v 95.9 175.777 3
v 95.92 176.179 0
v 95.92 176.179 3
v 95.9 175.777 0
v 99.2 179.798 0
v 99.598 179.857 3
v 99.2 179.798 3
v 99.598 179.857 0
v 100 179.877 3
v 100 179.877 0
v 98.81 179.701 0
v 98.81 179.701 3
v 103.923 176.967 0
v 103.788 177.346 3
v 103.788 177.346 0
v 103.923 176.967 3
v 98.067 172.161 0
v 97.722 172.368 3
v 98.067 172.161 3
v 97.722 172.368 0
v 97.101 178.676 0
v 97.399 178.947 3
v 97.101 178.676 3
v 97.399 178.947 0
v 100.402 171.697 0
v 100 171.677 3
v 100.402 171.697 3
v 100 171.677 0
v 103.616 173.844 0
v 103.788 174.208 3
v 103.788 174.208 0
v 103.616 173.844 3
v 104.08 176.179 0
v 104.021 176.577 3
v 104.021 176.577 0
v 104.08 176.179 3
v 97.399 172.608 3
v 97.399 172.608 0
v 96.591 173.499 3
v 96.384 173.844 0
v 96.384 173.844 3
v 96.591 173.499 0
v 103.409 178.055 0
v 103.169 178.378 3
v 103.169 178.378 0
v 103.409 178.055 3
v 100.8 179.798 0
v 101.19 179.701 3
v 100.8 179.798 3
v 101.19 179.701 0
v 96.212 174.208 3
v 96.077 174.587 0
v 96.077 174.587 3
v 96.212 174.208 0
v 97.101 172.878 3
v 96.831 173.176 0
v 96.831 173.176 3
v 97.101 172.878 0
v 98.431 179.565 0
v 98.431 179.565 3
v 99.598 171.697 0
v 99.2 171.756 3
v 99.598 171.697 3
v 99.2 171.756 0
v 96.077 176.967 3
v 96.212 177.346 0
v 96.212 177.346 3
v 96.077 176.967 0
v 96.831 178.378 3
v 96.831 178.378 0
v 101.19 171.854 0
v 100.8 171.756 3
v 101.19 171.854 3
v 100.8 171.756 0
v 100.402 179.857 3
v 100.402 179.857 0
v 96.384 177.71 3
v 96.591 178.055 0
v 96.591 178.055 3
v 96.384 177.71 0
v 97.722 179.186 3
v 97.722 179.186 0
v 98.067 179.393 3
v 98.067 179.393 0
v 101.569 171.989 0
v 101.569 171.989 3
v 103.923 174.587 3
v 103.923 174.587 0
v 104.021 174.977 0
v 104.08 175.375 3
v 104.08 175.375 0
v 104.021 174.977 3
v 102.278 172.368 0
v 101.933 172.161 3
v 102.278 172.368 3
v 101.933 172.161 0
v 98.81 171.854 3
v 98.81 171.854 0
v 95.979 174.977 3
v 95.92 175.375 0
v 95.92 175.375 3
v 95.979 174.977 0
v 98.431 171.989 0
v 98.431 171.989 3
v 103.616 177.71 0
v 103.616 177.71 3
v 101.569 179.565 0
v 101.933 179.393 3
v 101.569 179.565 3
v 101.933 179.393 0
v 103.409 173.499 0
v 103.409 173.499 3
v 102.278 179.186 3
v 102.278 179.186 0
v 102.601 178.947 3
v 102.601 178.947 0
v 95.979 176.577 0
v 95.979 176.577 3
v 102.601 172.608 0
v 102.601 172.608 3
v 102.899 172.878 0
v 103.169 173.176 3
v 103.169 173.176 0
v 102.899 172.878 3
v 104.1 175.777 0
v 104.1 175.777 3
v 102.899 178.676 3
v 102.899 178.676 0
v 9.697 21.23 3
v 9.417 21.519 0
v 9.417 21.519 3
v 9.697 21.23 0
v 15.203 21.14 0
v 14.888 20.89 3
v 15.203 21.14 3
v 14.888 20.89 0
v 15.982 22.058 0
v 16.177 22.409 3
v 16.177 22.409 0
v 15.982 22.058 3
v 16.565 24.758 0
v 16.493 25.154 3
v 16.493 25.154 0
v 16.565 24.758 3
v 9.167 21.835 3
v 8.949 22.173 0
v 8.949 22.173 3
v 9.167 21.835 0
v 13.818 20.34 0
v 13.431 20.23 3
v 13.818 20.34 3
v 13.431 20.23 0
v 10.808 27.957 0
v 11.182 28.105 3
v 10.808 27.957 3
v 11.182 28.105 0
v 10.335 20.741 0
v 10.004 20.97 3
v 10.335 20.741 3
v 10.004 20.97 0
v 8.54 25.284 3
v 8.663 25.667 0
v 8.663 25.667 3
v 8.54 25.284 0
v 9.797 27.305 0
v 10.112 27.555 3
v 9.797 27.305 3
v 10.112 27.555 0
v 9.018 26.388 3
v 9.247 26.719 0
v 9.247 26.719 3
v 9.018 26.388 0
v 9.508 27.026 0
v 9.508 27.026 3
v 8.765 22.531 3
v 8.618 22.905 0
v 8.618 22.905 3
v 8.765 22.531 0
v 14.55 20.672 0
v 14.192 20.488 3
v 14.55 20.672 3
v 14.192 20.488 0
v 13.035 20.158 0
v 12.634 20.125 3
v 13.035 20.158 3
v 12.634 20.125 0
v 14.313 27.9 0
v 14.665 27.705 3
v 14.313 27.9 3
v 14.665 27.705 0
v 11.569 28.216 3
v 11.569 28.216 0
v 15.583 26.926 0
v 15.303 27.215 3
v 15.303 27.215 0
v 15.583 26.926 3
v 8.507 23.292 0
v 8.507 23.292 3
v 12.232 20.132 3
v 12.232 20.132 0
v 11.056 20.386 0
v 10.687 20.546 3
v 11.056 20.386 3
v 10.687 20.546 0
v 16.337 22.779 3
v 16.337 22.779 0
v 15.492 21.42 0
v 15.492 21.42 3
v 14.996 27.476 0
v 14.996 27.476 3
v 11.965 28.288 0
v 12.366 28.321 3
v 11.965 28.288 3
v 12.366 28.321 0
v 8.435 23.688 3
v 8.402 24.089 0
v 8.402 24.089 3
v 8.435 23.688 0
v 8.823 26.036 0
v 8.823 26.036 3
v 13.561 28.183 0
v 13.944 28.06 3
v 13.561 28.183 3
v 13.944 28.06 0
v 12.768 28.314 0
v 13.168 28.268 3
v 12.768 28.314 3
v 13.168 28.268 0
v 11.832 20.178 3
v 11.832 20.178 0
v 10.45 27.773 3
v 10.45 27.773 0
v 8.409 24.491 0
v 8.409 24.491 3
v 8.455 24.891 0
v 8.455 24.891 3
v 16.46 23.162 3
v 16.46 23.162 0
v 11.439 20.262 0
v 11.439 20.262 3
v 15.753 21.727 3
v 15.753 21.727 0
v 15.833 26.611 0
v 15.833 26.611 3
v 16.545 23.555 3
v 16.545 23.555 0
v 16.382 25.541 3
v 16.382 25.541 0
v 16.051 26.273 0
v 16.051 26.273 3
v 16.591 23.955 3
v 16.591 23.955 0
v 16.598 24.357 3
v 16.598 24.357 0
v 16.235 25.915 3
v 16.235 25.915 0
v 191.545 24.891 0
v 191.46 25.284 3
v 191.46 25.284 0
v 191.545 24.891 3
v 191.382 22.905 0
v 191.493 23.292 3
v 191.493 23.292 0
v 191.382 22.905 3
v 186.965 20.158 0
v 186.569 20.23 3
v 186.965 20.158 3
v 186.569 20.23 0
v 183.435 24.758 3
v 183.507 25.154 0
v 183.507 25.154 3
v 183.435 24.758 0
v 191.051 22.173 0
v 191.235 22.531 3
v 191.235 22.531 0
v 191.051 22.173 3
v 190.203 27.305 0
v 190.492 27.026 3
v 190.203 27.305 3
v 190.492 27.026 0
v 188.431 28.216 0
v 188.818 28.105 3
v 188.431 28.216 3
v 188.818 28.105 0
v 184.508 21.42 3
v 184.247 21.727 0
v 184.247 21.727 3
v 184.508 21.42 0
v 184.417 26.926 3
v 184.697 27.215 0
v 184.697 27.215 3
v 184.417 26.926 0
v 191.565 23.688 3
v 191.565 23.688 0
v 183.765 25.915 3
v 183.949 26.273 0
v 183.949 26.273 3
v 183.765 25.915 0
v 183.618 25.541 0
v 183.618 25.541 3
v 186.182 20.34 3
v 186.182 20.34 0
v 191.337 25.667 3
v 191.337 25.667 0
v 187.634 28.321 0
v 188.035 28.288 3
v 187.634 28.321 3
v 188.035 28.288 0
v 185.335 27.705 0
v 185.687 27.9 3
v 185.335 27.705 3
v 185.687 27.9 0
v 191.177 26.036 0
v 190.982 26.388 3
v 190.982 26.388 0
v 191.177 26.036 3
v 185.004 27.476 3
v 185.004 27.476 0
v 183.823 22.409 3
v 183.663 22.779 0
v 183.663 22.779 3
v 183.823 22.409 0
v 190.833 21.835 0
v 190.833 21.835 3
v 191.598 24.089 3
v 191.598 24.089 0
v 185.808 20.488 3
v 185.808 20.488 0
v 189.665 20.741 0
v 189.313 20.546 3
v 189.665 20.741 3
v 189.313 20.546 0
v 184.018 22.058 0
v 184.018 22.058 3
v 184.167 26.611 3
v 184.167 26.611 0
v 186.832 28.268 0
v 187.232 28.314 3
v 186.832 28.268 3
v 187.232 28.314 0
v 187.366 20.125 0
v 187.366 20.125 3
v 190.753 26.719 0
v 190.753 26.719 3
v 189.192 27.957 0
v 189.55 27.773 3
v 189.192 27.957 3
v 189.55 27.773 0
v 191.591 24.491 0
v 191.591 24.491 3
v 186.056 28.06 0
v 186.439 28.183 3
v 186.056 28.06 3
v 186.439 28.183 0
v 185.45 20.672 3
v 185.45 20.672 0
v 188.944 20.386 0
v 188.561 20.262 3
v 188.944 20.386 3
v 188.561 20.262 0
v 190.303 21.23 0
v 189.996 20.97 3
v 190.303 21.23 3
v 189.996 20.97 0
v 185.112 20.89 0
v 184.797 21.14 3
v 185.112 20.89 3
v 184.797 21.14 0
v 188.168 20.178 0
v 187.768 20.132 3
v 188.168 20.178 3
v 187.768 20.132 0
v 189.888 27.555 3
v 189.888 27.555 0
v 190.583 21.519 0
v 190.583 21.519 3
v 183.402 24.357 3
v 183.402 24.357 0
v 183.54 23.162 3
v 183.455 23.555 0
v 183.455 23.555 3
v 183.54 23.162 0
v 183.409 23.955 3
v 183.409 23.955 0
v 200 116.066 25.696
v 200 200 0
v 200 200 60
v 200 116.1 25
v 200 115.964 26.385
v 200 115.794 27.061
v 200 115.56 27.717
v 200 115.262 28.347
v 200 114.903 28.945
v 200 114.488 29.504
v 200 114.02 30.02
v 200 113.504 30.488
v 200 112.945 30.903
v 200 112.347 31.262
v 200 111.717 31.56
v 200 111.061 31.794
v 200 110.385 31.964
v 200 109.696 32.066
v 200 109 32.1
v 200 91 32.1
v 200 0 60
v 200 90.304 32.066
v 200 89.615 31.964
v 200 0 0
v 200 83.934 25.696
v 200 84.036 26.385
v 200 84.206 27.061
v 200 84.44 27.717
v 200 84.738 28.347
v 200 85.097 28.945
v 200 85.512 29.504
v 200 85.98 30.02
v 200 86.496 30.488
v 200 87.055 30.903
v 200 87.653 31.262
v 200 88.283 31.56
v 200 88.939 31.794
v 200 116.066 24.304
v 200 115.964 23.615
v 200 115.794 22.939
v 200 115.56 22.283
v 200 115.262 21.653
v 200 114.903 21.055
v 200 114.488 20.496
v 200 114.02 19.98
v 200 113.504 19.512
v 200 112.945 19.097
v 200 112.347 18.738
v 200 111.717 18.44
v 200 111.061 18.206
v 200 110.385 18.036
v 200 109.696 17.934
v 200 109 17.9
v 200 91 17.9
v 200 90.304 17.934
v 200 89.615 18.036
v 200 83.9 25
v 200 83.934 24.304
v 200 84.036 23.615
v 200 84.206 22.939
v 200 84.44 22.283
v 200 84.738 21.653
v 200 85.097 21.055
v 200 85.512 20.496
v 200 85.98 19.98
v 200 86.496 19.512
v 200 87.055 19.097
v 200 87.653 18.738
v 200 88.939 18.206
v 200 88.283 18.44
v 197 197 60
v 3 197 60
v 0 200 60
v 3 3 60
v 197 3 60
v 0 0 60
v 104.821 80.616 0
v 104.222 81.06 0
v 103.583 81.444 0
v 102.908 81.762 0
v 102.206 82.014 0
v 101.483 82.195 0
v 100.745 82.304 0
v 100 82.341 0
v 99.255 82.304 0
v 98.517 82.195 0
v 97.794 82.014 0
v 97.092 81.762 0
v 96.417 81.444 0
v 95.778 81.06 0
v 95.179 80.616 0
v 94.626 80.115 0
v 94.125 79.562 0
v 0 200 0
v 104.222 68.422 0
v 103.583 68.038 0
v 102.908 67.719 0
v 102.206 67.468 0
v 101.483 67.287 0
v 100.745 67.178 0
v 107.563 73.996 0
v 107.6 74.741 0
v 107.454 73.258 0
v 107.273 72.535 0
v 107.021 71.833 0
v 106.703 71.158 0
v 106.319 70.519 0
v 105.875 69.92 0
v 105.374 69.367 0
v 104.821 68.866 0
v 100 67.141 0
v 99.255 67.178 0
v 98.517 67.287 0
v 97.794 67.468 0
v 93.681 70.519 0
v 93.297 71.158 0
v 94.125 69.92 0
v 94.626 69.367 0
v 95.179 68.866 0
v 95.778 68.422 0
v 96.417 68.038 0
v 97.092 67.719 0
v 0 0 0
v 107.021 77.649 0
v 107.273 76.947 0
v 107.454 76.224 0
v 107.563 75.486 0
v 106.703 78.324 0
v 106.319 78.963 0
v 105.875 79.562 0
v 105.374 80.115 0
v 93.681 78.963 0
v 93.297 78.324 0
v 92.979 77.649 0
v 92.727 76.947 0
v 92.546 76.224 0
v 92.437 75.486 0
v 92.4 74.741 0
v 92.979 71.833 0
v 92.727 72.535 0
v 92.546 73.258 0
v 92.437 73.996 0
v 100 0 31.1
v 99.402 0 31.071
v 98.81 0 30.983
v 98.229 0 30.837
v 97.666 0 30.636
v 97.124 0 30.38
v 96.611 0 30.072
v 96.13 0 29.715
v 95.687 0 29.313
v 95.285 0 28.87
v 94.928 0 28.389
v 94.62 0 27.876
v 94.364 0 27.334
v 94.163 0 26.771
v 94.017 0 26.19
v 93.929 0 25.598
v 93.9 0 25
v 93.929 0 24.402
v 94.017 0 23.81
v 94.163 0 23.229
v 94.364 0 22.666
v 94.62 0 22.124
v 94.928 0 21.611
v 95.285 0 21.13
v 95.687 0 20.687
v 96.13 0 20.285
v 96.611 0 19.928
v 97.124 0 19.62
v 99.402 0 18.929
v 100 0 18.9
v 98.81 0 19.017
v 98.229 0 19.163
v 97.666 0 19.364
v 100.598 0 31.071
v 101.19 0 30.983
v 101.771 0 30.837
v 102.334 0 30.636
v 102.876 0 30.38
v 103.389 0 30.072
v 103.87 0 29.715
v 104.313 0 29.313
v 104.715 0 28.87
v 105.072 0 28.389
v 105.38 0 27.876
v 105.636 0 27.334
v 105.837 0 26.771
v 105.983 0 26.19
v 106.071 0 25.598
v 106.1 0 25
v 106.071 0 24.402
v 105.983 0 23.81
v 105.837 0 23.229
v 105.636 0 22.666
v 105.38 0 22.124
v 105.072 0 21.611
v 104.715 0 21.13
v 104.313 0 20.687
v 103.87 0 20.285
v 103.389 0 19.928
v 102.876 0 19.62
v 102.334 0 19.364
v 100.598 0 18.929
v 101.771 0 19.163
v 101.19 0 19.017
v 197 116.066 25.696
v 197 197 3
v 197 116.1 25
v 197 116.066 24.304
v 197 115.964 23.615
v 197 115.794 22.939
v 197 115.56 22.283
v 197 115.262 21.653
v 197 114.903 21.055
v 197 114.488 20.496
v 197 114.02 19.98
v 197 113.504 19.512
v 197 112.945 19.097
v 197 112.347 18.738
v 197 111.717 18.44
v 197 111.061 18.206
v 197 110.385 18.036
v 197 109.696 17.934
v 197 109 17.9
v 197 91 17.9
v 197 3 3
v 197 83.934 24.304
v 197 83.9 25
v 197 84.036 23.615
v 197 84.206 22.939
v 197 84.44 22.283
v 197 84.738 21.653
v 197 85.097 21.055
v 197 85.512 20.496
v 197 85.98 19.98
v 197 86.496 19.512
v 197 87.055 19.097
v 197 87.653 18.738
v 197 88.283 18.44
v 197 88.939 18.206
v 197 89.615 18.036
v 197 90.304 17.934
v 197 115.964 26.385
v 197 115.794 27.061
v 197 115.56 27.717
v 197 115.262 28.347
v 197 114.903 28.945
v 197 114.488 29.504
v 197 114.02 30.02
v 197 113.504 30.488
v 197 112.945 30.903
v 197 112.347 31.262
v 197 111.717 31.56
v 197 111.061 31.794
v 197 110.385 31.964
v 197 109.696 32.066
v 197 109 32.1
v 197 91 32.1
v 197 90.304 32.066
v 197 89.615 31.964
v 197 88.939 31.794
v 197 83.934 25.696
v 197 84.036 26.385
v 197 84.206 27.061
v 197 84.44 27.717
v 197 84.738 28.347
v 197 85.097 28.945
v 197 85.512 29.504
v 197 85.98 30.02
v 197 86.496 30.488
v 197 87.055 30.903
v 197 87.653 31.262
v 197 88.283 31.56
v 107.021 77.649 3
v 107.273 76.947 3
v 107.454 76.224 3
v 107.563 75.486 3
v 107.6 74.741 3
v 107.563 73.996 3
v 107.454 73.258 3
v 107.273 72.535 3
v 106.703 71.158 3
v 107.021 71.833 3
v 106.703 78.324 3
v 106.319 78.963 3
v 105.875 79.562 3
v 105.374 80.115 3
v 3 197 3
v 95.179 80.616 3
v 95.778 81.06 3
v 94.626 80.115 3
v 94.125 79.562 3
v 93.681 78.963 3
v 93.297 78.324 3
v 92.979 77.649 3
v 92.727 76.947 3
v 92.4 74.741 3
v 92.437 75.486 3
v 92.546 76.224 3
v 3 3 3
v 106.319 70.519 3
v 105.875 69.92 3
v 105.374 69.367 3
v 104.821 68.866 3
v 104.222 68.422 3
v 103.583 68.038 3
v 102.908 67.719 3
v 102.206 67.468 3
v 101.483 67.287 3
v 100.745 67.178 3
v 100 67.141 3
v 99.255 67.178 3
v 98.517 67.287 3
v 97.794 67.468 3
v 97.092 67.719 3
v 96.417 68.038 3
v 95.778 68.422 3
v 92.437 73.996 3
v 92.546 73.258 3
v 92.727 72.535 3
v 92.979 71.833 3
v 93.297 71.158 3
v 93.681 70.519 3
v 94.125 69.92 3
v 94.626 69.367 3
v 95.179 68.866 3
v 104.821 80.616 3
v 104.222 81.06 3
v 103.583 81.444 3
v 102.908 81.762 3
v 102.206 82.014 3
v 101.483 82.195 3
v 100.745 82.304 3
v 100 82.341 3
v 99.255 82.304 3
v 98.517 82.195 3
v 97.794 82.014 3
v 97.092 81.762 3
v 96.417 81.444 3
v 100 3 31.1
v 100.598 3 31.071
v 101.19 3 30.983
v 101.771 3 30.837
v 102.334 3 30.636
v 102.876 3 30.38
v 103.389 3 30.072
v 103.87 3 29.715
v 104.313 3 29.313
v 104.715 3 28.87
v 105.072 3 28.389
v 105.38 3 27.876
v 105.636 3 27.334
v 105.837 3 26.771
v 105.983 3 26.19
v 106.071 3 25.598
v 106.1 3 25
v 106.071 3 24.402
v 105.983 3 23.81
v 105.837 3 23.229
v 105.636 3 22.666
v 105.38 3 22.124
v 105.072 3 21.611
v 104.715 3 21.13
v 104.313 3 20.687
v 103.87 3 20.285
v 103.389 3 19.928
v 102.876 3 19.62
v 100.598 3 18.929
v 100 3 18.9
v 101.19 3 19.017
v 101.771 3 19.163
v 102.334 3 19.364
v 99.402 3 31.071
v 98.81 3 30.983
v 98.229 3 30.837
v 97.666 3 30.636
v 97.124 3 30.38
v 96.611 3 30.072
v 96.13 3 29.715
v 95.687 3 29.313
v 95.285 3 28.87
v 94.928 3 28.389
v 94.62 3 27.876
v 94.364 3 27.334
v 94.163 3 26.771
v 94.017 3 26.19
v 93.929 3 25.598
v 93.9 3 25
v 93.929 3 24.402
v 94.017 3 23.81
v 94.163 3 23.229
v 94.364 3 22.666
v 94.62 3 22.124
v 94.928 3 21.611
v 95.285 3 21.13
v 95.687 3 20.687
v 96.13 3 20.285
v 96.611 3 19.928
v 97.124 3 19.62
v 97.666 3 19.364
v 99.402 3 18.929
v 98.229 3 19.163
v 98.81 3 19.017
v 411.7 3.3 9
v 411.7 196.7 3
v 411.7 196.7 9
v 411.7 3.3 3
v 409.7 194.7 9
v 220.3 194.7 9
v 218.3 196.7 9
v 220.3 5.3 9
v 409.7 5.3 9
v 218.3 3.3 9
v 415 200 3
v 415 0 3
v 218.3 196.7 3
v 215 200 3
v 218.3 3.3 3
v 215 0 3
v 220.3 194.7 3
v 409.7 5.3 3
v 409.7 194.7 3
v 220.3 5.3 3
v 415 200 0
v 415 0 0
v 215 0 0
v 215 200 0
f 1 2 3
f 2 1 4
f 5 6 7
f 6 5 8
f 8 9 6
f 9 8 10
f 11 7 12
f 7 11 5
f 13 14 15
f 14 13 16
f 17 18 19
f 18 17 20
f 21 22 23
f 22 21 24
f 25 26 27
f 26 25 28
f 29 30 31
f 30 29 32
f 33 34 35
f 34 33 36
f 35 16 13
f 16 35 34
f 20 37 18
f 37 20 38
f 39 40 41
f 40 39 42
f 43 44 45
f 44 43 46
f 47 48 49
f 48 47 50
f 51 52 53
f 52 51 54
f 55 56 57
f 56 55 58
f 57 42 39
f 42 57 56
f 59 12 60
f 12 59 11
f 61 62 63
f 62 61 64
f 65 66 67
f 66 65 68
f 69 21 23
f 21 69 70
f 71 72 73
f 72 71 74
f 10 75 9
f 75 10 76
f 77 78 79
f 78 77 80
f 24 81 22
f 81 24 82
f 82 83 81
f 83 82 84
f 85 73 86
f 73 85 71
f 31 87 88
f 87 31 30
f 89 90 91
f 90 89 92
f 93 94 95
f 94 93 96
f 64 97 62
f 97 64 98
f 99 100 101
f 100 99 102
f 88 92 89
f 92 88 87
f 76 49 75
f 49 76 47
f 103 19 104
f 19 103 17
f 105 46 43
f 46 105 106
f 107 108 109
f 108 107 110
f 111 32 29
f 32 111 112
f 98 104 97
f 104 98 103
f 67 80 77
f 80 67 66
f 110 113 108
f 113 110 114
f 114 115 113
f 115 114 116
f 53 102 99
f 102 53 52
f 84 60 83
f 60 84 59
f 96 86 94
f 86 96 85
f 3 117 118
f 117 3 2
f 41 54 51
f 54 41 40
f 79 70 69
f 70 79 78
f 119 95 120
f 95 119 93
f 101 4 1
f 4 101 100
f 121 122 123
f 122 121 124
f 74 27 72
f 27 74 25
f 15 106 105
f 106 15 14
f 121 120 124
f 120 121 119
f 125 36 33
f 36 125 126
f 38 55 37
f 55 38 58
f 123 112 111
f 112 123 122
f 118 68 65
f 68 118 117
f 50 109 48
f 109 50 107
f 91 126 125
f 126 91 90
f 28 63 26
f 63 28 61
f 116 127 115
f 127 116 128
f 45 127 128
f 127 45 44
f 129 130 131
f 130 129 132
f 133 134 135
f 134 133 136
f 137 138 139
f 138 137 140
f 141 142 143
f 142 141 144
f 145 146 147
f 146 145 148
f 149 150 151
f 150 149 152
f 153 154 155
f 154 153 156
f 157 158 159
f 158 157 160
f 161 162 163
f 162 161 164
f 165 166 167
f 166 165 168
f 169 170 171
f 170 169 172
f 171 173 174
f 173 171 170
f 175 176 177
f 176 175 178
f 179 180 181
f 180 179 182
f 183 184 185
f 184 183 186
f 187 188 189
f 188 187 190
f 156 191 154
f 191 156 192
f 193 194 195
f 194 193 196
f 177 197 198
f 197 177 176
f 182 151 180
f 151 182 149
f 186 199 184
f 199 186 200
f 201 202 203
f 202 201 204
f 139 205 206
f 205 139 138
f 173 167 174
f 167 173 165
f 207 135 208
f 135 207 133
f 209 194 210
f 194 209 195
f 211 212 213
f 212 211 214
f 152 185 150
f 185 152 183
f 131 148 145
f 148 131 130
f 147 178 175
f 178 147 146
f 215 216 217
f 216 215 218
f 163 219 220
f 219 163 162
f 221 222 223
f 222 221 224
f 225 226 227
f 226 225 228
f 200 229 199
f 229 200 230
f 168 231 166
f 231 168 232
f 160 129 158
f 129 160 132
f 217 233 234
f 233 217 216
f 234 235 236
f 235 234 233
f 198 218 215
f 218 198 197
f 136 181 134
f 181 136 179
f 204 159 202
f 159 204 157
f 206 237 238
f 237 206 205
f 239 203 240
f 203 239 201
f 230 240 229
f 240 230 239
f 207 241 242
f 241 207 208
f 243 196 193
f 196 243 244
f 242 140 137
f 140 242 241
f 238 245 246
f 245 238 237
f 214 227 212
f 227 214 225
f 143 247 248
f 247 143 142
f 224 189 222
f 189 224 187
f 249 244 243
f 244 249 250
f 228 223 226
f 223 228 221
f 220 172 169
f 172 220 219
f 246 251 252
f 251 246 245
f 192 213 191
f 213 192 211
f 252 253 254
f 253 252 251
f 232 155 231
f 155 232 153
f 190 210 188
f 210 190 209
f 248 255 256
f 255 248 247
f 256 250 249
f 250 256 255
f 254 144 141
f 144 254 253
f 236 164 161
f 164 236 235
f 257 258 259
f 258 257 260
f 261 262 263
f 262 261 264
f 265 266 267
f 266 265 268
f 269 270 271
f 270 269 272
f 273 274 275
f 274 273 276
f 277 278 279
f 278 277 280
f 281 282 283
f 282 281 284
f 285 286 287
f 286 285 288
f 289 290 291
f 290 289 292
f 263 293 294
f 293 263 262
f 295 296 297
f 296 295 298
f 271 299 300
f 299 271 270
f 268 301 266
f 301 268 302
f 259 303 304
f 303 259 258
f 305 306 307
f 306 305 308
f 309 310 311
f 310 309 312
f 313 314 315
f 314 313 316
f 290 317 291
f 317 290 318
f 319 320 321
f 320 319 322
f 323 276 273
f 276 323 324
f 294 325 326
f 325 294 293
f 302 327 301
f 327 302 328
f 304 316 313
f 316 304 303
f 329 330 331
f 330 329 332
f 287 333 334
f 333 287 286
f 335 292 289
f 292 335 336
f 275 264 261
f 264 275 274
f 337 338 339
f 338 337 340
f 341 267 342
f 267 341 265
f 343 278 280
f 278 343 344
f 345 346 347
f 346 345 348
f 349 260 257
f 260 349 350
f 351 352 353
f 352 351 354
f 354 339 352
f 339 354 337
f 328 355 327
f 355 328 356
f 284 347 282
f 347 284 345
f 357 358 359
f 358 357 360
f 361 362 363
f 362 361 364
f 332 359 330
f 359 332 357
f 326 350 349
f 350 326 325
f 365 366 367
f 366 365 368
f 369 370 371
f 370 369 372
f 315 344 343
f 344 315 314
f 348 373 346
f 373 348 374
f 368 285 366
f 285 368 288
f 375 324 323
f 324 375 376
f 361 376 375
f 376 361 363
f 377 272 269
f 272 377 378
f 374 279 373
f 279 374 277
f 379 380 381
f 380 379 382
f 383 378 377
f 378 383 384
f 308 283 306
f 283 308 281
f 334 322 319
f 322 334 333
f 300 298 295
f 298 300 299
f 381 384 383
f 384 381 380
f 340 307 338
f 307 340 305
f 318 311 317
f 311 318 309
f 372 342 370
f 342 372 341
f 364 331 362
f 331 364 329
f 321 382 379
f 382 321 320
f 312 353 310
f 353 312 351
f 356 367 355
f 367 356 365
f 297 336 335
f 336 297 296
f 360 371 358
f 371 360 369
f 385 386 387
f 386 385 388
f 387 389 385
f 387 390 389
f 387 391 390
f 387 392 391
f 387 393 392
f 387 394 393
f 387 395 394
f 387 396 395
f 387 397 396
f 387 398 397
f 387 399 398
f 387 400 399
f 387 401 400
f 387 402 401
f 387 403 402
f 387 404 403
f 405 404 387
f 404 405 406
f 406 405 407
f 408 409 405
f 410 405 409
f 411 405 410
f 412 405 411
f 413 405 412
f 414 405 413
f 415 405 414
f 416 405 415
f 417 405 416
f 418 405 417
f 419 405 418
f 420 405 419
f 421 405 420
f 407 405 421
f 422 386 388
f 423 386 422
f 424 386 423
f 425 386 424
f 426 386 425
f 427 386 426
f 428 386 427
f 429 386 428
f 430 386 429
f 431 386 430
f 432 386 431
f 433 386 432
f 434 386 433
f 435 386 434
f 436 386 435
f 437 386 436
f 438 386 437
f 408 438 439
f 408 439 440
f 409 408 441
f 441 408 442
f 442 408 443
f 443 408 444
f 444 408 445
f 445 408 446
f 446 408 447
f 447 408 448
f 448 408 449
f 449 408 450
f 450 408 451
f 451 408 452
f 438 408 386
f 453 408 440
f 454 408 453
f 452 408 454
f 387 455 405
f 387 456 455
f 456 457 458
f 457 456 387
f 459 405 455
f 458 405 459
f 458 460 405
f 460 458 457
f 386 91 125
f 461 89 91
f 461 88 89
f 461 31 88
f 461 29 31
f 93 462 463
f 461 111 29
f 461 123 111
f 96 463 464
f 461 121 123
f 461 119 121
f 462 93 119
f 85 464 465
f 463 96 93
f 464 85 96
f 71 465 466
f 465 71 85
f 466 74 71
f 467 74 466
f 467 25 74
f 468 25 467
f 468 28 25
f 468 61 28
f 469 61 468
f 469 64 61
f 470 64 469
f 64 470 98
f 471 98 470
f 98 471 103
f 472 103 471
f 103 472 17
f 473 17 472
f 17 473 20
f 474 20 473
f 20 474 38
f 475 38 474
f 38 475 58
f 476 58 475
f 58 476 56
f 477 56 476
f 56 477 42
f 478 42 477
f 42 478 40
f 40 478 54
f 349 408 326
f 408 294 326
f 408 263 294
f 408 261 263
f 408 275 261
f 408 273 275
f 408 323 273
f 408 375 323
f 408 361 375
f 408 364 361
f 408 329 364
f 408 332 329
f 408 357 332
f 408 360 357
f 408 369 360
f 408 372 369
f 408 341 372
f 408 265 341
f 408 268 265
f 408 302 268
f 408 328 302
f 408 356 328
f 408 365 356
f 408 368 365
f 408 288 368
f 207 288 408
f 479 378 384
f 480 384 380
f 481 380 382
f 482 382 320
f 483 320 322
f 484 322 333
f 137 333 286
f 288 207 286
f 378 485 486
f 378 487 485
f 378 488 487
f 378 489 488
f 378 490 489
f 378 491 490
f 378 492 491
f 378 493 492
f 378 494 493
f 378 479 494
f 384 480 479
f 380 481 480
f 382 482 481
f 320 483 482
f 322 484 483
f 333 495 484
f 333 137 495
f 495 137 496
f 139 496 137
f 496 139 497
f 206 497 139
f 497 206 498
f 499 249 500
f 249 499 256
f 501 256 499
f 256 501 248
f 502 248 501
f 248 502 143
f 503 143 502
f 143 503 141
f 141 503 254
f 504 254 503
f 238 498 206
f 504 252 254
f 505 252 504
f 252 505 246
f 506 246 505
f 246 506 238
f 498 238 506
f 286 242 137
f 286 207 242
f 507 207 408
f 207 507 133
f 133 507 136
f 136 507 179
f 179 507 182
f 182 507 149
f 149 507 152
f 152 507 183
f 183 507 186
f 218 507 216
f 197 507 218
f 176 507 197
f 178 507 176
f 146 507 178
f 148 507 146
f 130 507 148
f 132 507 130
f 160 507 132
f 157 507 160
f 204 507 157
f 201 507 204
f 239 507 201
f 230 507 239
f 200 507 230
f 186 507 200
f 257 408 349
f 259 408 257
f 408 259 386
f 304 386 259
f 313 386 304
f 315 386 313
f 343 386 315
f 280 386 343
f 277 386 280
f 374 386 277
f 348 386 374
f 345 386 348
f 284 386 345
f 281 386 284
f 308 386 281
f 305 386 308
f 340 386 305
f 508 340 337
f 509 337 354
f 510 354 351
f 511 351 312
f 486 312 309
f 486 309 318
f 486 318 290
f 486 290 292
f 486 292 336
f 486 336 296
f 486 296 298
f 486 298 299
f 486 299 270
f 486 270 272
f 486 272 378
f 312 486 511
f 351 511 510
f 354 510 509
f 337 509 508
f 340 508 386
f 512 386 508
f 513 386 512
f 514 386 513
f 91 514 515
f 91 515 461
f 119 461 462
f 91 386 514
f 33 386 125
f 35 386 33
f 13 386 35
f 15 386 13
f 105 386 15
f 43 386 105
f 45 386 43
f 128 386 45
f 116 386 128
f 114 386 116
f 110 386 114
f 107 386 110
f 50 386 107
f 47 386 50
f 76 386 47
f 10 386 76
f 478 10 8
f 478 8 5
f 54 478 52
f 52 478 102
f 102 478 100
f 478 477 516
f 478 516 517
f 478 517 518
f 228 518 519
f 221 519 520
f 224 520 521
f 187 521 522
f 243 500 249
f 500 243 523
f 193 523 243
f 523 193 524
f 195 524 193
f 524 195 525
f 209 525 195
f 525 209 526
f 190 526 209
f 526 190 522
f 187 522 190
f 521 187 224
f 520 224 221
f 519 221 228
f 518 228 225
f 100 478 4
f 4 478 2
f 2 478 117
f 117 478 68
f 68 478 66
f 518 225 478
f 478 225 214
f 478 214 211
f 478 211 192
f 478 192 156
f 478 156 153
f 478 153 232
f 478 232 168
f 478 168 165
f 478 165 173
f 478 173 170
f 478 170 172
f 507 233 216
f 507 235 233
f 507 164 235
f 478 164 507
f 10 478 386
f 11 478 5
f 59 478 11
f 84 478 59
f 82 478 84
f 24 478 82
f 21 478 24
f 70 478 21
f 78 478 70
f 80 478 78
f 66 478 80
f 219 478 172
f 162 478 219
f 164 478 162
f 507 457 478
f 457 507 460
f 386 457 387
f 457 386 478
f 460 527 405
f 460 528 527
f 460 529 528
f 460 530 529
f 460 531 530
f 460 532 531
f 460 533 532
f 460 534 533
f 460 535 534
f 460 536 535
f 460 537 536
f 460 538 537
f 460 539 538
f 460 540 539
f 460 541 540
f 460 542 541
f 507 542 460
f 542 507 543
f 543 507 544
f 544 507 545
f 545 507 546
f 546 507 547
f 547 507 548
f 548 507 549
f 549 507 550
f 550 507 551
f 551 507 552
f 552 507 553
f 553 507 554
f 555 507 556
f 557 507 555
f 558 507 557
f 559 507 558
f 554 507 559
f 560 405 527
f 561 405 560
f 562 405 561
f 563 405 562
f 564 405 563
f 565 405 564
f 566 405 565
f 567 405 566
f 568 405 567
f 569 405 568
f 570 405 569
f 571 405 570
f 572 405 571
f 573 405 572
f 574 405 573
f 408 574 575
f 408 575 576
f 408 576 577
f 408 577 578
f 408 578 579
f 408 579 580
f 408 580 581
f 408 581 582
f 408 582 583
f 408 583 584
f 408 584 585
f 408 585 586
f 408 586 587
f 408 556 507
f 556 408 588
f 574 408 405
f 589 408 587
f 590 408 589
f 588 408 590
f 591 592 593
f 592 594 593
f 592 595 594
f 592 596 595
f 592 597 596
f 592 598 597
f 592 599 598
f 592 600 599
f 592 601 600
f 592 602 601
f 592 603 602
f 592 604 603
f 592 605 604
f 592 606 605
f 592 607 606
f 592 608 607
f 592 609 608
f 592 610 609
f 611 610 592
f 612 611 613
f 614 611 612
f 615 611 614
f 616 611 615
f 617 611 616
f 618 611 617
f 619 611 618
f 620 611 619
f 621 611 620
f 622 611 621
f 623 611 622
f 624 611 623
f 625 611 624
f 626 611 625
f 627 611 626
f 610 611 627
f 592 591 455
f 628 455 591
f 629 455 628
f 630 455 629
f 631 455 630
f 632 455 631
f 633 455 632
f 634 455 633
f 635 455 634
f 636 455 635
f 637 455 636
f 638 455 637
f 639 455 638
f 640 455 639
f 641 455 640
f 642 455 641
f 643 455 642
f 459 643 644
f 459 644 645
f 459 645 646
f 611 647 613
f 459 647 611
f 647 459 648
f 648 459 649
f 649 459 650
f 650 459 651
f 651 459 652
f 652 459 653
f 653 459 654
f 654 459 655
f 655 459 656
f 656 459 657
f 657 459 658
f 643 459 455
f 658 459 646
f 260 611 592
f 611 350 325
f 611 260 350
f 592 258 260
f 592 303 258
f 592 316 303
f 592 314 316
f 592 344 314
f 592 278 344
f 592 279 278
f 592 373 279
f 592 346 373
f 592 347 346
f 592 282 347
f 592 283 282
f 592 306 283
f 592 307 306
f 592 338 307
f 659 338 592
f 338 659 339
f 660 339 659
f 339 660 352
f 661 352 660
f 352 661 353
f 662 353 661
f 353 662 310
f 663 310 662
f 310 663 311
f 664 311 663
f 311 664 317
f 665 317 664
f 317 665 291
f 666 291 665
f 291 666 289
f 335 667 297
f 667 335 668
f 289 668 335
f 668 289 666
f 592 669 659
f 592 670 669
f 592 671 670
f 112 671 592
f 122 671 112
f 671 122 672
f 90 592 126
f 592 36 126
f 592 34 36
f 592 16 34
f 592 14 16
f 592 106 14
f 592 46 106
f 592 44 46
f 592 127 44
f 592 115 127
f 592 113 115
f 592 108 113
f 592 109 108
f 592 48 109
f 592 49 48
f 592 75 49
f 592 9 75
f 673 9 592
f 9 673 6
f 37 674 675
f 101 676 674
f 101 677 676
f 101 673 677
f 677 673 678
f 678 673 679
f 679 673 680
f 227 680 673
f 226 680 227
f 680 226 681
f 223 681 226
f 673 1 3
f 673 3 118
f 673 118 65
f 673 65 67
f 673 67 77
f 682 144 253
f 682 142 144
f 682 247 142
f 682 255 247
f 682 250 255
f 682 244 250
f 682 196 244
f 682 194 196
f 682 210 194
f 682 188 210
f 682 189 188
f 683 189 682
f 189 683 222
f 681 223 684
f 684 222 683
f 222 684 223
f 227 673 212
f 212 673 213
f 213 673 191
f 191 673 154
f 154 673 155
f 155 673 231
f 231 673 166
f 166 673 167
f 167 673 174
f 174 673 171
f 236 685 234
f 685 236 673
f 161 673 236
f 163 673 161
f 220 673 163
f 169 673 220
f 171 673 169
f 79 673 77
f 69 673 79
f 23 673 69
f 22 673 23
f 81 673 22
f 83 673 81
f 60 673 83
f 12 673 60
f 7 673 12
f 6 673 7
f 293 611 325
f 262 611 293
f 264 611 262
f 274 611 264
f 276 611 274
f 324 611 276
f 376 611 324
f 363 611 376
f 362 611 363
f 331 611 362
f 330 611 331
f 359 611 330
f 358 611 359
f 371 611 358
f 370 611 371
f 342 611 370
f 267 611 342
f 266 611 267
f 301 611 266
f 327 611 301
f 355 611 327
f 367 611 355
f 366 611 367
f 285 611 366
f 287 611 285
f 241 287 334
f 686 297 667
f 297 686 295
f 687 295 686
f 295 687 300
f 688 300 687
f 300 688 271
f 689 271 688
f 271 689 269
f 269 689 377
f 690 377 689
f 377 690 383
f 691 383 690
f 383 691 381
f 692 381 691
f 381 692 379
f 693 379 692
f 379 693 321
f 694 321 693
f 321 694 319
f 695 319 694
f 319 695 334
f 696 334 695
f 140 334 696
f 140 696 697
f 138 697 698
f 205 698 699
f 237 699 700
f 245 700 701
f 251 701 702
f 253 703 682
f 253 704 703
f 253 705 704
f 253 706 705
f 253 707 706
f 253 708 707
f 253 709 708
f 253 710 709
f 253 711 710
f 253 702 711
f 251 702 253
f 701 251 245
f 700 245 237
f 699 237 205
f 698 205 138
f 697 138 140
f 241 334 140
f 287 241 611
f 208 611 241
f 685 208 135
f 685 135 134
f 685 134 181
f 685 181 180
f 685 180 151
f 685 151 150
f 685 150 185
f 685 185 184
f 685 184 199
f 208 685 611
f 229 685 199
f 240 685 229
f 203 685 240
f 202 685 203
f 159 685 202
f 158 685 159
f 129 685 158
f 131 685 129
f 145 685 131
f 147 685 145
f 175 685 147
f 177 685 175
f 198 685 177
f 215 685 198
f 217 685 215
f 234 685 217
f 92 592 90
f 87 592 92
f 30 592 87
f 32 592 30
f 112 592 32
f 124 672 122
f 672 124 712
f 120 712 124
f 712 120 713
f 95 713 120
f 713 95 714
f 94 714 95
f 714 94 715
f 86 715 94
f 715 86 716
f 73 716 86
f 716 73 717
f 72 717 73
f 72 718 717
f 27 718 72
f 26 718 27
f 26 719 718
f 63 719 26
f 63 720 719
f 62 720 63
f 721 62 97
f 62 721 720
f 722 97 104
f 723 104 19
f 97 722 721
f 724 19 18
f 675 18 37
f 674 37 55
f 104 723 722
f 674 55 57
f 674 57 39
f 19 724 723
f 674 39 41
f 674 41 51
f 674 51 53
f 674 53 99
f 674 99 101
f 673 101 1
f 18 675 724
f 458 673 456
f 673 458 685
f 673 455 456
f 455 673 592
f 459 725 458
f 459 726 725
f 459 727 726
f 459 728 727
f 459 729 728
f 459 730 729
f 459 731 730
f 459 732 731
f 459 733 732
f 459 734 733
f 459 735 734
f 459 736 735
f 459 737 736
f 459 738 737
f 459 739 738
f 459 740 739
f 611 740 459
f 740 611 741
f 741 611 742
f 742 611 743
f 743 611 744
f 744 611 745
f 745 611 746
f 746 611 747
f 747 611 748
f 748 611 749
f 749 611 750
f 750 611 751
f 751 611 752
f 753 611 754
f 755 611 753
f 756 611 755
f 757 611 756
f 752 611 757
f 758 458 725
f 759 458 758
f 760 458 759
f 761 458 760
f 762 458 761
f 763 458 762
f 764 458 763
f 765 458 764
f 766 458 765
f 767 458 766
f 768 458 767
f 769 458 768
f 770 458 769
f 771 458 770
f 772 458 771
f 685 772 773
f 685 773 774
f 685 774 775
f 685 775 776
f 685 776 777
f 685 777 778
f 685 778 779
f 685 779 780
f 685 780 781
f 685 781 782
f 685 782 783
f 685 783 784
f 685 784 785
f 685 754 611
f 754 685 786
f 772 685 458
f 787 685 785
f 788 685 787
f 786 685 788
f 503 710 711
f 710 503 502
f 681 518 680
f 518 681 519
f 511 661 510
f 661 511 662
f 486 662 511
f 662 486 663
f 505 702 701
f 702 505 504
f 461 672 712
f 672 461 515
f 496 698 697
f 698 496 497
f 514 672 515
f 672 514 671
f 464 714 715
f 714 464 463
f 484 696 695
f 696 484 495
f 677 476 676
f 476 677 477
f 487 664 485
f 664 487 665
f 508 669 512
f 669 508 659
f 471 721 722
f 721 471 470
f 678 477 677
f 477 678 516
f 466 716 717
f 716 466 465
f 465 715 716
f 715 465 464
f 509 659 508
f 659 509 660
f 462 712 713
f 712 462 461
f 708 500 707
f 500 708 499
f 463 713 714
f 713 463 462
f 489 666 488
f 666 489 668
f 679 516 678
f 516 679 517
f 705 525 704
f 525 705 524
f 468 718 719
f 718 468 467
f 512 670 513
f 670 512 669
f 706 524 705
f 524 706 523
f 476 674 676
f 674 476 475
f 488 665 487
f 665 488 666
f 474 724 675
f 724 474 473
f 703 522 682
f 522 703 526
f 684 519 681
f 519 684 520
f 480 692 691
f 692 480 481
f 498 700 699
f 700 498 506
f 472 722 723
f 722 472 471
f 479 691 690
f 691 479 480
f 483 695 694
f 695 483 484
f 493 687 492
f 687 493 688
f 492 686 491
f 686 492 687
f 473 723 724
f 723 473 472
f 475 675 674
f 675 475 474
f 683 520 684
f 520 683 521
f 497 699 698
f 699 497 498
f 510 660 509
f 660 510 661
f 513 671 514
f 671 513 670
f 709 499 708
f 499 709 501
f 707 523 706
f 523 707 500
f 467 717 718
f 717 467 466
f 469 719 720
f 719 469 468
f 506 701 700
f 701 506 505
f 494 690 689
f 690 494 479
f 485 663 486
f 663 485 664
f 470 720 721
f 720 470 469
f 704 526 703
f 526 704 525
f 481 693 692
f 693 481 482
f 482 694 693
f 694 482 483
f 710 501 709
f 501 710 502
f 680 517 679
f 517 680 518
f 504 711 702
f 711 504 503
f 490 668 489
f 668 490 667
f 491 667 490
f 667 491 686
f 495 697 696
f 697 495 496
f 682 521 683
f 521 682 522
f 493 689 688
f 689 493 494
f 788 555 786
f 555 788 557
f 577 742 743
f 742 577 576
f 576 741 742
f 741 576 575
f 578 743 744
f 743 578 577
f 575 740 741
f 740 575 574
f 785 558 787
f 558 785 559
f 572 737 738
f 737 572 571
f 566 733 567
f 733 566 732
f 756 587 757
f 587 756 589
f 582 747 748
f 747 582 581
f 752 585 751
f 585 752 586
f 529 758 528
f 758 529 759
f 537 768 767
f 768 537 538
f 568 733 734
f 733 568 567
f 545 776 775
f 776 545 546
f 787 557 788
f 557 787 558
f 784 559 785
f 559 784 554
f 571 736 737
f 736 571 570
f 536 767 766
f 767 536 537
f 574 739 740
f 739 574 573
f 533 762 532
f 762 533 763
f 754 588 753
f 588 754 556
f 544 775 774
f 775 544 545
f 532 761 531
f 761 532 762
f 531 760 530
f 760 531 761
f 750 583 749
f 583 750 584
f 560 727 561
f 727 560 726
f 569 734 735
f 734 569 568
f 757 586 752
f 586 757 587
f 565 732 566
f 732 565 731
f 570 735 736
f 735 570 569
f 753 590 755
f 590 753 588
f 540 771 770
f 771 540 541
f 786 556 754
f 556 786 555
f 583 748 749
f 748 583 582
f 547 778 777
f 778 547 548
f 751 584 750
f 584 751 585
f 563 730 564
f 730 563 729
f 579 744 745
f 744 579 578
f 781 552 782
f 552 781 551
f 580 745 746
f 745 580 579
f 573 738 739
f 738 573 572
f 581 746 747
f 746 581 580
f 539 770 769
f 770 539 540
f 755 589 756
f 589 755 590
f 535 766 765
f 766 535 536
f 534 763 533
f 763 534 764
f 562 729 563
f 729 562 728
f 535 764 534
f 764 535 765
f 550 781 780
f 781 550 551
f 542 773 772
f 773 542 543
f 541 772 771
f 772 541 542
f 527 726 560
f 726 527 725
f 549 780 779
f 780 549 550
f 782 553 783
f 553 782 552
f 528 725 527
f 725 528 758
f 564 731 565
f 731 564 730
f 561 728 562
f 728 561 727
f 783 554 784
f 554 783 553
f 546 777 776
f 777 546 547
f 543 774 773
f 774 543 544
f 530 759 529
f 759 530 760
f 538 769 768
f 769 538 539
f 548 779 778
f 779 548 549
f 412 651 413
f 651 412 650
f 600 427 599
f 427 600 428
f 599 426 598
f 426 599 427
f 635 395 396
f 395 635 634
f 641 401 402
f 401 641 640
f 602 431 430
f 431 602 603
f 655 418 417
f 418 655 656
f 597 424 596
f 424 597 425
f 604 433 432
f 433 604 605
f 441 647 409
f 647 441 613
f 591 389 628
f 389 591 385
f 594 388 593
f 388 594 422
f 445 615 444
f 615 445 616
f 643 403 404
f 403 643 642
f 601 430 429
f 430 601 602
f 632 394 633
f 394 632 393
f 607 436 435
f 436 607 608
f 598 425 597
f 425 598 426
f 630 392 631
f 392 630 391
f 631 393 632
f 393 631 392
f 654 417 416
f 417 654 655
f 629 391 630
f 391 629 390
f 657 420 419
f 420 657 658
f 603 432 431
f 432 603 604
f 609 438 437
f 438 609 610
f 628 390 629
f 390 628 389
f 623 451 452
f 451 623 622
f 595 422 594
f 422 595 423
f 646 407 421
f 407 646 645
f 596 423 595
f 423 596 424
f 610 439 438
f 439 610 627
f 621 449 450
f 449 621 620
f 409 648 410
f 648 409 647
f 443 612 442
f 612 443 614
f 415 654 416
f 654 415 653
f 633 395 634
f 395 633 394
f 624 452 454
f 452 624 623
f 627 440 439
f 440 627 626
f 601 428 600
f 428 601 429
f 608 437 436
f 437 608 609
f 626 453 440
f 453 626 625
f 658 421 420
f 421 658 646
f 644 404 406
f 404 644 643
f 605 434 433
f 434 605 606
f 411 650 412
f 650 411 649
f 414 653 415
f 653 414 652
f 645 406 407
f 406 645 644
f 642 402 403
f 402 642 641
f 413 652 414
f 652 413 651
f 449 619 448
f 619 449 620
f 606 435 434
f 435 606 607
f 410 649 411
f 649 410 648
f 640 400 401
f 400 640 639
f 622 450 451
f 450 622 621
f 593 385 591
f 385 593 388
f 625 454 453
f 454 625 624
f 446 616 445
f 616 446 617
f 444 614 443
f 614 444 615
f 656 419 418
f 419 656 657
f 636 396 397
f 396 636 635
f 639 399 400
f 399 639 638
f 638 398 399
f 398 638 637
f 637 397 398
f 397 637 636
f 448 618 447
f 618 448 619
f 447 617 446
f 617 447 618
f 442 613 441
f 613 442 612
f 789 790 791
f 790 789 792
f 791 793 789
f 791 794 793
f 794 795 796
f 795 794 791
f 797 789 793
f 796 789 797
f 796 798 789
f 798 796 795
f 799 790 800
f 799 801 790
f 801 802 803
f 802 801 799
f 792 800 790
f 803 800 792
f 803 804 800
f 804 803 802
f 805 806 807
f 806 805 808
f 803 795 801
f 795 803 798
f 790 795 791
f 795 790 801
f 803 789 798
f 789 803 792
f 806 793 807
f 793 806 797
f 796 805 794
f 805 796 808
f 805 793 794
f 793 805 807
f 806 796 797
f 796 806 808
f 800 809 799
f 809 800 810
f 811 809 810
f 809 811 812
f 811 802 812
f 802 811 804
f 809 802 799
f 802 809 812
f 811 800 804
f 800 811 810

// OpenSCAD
// ENGR489 electronics enclosure: open-top box + friction-fit lid.
// Print in PLA (non-magnetic). All dimensions in mm.
//
// Floor holes match the base-plate sketch: three Ø8 screw holes on a
// 175 mm equilateral triangle, Ø15 wire hole at the triangle centroid.
//
// Export:  openscad -D 'part="box"' -o box.stl enclosure.scad
//          openscad -D 'part="lid"' -o lid.stl enclosure.scad

part = "both";          // "box", "lid" or "both"

// --- Box ---
L = 200;                // outer length (X)
W = 200;                // outer width  (Y)
H = 60;                 // outer height of the box (without lid)
wall = 3;
floor_t = 3;
print_corr = 0.2;       // +0.2 mm hole correction for printed parts

// --- Floor holes (from base-plate sketch) ---
tri_side = 175;         // screw triangle side length
screw_d = 8;            // screw hole diameter
wire_d = 15;            // centre wire hole diameter
tri_R = tri_side / sqrt(3);                 // centroid -> screw distance
// Centre the triangle's extent in the box (flat edge toward front, y = 0)
tri_cx = L / 2;
tri_cy = W / 2 - (tri_R - tri_R / 2) / 2;

// --- Wall holes ---
power_d = 12;           // front wall: fits a 5.5x2.1 panel jack or battery leads
power_z = 25;           // height of hole centre above the bottom
usb_slot_w = 32;        // right wall: slot for 2 cables to the PC
usb_slot_h = 14;        // big enough to pass USB plugs through
usb_z = 25;

// --- Lid ---
lid_t = 3;
lip_h = 6;
lip_t = 2;
lip_clear = 0.3;        // gap between lip and inner wall for a friction fit

$fn = 64;

module screw_positions() {
    translate([tri_cx, tri_cy])
        for (a = [90, 210, 330])
            rotate(a) translate([tri_R, 0]) children();
}

module box() {
    difference() {
        cube([L, W, H]);
        translate([wall, wall, floor_t]) cube([L - 2*wall, W - 2*wall, H]);

        // Floor: 3 screw holes + centre wire hole
        screw_positions()
            translate([0, 0, -1]) cylinder(d = screw_d + print_corr, h = floor_t + 2);
        translate([tri_cx, tri_cy, -1]) cylinder(d = wire_d + print_corr, h = floor_t + 2);

        // Front wall (y = 0): power in
        translate([L/2, -1, power_z]) rotate([-90, 0, 0])
            cylinder(d = power_d + print_corr, h = wall + 2);

        // Right wall (x = L): rounded slot for the 2 PC cables
        translate([L - wall - 1, W/2, usb_z]) rotate([0, 90, 0])
            hull() for (s = [-1, 1])
                translate([0, s * (usb_slot_w - usb_slot_h) / 2, 0])
                    cylinder(d = usb_slot_h + print_corr, h = wall + 2);
    }
}

module lid() {
    // Printed top-down: plate on the bed, lip pointing up
    cube([L, W, lid_t]);
    o = wall + lip_clear;
    translate([o, o, lid_t]) difference() {
        cube([L - 2*o, W - 2*o, lip_h]);
        translate([lip_t, lip_t, -1]) cube([L - 2*o - 2*lip_t, W - 2*o - 2*lip_t, lip_h + 2]);
    }
}

if (part == "box")  box();
if (part == "lid")  lid();
if (part == "both") { box(); translate([L + 15, 0, 0]) lid(); }
